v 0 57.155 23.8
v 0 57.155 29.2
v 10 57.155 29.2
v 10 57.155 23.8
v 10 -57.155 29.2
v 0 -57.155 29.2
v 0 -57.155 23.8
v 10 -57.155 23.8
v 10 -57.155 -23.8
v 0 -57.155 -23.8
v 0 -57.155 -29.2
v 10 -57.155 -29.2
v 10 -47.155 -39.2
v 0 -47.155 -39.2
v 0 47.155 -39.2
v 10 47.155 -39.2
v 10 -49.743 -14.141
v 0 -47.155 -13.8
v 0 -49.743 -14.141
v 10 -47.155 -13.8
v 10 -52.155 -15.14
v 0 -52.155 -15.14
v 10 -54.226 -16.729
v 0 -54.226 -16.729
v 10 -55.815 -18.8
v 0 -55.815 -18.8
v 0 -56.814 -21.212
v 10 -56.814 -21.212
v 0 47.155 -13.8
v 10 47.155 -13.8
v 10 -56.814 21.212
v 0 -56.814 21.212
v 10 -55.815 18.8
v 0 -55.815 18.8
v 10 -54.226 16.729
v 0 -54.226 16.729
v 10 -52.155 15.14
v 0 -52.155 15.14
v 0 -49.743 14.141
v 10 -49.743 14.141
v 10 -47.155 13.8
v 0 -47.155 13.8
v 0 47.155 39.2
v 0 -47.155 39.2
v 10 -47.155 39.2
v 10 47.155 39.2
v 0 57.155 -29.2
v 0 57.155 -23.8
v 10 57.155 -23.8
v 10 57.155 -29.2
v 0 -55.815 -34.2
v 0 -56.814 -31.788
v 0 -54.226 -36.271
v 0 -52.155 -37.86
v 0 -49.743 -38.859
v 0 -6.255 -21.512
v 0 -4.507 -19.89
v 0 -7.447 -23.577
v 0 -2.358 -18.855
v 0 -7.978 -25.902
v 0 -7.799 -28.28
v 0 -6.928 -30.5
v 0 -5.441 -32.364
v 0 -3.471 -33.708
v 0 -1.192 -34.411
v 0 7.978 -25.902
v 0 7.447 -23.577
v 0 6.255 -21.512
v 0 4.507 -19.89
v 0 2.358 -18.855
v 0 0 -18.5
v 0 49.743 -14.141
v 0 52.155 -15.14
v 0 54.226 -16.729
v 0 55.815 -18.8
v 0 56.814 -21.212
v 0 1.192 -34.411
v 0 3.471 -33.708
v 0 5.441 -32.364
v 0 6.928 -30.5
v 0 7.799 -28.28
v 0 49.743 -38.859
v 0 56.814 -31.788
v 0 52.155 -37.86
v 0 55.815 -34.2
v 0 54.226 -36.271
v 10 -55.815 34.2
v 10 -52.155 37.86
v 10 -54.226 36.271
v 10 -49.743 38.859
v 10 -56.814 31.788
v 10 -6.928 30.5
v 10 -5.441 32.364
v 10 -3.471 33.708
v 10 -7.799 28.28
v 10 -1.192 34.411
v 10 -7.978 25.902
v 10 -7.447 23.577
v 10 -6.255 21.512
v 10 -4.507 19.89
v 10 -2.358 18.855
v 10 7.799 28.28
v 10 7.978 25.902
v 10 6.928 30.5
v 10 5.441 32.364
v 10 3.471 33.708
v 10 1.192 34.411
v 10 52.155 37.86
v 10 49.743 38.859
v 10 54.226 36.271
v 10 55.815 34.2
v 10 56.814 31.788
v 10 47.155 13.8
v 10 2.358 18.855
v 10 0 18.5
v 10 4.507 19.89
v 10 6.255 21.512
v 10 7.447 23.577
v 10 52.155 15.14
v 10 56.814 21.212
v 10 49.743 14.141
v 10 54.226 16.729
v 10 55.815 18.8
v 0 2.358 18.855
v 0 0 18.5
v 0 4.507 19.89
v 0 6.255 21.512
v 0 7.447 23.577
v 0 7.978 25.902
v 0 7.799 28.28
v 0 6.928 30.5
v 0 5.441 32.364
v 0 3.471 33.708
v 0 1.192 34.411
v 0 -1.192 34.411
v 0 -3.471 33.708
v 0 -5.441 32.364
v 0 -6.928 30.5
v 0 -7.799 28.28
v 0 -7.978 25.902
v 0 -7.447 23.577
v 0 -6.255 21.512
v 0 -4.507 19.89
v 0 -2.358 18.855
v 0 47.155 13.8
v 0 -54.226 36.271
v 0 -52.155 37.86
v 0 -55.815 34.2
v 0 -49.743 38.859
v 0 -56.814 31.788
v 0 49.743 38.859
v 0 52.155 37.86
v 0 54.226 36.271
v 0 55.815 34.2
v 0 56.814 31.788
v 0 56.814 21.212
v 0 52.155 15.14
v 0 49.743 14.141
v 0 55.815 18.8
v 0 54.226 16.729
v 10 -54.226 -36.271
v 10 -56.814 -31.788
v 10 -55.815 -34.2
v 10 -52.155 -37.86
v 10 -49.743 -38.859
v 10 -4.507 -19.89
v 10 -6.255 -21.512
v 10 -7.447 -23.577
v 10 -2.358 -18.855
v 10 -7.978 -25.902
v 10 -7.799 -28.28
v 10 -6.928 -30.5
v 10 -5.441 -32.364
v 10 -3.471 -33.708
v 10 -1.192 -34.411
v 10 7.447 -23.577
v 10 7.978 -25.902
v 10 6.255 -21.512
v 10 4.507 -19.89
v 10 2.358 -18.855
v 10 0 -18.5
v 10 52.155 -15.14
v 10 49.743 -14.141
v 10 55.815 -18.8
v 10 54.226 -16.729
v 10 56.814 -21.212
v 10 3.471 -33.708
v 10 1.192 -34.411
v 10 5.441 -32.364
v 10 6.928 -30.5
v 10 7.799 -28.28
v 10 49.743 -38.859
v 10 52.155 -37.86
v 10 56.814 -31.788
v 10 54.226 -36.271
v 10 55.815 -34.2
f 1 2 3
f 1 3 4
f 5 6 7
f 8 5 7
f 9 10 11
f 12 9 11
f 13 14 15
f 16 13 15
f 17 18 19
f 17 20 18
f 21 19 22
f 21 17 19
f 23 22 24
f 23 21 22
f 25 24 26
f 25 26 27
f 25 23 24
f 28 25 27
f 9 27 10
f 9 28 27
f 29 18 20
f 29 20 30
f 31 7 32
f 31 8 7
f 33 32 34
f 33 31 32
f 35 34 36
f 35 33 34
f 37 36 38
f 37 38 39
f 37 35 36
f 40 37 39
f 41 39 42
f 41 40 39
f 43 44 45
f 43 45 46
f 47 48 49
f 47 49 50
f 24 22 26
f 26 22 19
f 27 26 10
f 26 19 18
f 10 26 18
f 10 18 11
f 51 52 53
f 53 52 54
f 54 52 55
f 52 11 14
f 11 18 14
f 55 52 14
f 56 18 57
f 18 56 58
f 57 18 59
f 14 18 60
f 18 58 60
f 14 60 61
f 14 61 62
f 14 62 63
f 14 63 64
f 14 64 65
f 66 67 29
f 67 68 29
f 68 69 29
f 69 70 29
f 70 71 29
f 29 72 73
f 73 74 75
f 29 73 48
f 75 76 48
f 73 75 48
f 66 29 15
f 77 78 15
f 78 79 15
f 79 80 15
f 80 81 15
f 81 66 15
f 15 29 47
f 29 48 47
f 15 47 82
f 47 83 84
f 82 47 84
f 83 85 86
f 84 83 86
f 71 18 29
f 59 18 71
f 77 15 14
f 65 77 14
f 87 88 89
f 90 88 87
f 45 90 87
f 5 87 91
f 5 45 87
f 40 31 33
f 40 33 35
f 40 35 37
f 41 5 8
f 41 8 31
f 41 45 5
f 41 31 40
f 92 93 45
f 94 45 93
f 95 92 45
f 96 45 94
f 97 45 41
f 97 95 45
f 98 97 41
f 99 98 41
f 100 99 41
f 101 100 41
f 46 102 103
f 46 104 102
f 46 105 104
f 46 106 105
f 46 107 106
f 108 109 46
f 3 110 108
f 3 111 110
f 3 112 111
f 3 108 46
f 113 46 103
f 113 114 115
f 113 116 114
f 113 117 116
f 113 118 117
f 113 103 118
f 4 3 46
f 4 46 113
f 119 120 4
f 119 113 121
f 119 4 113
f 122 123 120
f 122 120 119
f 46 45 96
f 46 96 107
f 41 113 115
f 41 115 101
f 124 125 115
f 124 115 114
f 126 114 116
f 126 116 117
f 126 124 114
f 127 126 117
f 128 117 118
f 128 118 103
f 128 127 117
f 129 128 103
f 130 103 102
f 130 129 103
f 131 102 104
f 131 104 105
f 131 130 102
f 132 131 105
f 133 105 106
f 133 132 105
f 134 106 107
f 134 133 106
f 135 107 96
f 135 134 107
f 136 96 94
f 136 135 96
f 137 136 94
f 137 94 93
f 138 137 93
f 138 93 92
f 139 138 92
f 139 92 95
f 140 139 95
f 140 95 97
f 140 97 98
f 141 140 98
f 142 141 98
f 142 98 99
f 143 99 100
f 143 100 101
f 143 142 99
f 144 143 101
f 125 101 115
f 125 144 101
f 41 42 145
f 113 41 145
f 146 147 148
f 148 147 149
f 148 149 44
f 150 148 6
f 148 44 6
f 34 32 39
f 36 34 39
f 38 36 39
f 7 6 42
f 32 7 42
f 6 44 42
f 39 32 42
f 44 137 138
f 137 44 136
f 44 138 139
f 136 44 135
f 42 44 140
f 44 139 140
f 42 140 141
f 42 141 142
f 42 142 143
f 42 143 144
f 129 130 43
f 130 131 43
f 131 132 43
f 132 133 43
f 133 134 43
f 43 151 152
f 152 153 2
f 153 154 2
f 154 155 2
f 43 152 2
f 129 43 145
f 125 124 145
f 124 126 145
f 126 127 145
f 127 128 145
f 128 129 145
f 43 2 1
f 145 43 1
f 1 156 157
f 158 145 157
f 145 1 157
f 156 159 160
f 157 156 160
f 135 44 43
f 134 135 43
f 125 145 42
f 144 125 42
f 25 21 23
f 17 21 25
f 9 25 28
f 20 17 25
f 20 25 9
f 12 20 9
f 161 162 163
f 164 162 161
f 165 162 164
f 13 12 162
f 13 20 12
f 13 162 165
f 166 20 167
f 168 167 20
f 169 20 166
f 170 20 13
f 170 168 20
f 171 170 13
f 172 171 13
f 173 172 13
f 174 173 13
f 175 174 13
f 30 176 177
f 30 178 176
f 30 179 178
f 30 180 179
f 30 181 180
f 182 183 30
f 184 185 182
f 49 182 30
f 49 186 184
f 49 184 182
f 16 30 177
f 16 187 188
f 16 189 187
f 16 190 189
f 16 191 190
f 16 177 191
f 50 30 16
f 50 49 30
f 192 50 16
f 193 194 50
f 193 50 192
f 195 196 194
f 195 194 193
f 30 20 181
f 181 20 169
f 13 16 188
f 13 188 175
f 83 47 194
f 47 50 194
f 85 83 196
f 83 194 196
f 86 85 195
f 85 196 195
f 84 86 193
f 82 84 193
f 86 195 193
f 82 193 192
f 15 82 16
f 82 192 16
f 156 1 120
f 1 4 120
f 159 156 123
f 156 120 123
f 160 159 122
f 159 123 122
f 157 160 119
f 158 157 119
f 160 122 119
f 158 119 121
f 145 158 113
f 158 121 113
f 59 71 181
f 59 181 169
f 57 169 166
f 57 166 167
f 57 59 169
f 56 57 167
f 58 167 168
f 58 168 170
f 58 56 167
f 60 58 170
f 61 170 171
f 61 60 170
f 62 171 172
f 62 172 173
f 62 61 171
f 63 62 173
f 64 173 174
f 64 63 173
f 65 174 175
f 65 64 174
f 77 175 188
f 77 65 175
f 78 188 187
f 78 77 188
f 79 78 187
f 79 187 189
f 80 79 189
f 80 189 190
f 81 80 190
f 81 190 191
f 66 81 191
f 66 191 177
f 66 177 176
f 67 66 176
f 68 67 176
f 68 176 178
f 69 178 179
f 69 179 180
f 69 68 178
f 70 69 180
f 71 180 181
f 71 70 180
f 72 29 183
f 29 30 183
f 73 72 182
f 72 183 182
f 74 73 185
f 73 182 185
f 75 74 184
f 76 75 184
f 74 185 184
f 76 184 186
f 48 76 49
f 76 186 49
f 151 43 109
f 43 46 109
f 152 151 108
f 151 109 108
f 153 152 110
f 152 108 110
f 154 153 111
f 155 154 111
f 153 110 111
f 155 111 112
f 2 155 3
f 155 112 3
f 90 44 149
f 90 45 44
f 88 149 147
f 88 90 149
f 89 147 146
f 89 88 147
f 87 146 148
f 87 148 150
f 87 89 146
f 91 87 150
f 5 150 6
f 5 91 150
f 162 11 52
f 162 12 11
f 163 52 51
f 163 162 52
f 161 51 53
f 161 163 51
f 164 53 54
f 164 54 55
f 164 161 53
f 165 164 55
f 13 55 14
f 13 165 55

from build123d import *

# Parameters (mm, degrees)
CROQUIS1_W                = 25.4
CROQUIS1_H                = 114.31
CROQUIS1_R                = 8
SALIENTE_EXTRUIR2_DEPTH   = 10
SALIENTE_EXTRUIR2_2_DEPTH = 10
REDONDEO1_R               = 10
REDONDEO2_R               = 10


with BuildPart() as part:
    # Croquis1 → Saliente-Extruir2 (new body)
    with BuildSketch(Plane(origin=(0, 0, 0), x_dir=(0, 0, -1), z_dir=(1, 0, 0))):
        with Locations((-26.5, 0)):
            Rectangle(CROQUIS1_W, CROQUIS1_H)
        with Locations((-26.5, 0)):
            Circle(CROQUIS1_R, mode=Mode.SUBTRACT)
    extrude(amount=SALIENTE_EXTRUIR2_DEPTH)

    # Redondeo1
    redondeo1_edges = [part.edges().sort_by_distance(p)[0] for p in [
        (5, -57.155, 13.8),
        (5, -57.155, 39.2),
        (5, 57.155, 39.2),
        (5, 57.155, 13.8),
    ]]
    fillet(redondeo1_edges, radius=REDONDEO1_R)


with BuildPart() as body_2:
    # Croquis1 → Saliente-Extruir2 2 (new body)
    with BuildSketch(Plane(origin=(0, 0, 0), x_dir=(0, 0, -1), z_dir=(1, 0, 0))):
        with Locations((26.5, 0)):
            Rectangle(CROQUIS1_W, CROQUIS1_H)
        with Locations(Location((26.5, 0, 0), (0, 0, 180))):
            Circle(CROQUIS1_R, mode=Mode.SUBTRACT)
    extrude(amount=SALIENTE_EXTRUIR2_2_DEPTH)

    # Redondeo2
    redondeo2_edges = [body_2.edges().sort_by_distance(p)[0] for p in [
        (5, -57.155, -39.2),
        (5, -57.155, -13.8),
        (5, 57.155, -13.8),
        (5, 57.155, -39.2),
    ]]
    fillet(redondeo2_edges, radius=REDONDEO2_R)


solid = Compound([part.part, body_2.part])
